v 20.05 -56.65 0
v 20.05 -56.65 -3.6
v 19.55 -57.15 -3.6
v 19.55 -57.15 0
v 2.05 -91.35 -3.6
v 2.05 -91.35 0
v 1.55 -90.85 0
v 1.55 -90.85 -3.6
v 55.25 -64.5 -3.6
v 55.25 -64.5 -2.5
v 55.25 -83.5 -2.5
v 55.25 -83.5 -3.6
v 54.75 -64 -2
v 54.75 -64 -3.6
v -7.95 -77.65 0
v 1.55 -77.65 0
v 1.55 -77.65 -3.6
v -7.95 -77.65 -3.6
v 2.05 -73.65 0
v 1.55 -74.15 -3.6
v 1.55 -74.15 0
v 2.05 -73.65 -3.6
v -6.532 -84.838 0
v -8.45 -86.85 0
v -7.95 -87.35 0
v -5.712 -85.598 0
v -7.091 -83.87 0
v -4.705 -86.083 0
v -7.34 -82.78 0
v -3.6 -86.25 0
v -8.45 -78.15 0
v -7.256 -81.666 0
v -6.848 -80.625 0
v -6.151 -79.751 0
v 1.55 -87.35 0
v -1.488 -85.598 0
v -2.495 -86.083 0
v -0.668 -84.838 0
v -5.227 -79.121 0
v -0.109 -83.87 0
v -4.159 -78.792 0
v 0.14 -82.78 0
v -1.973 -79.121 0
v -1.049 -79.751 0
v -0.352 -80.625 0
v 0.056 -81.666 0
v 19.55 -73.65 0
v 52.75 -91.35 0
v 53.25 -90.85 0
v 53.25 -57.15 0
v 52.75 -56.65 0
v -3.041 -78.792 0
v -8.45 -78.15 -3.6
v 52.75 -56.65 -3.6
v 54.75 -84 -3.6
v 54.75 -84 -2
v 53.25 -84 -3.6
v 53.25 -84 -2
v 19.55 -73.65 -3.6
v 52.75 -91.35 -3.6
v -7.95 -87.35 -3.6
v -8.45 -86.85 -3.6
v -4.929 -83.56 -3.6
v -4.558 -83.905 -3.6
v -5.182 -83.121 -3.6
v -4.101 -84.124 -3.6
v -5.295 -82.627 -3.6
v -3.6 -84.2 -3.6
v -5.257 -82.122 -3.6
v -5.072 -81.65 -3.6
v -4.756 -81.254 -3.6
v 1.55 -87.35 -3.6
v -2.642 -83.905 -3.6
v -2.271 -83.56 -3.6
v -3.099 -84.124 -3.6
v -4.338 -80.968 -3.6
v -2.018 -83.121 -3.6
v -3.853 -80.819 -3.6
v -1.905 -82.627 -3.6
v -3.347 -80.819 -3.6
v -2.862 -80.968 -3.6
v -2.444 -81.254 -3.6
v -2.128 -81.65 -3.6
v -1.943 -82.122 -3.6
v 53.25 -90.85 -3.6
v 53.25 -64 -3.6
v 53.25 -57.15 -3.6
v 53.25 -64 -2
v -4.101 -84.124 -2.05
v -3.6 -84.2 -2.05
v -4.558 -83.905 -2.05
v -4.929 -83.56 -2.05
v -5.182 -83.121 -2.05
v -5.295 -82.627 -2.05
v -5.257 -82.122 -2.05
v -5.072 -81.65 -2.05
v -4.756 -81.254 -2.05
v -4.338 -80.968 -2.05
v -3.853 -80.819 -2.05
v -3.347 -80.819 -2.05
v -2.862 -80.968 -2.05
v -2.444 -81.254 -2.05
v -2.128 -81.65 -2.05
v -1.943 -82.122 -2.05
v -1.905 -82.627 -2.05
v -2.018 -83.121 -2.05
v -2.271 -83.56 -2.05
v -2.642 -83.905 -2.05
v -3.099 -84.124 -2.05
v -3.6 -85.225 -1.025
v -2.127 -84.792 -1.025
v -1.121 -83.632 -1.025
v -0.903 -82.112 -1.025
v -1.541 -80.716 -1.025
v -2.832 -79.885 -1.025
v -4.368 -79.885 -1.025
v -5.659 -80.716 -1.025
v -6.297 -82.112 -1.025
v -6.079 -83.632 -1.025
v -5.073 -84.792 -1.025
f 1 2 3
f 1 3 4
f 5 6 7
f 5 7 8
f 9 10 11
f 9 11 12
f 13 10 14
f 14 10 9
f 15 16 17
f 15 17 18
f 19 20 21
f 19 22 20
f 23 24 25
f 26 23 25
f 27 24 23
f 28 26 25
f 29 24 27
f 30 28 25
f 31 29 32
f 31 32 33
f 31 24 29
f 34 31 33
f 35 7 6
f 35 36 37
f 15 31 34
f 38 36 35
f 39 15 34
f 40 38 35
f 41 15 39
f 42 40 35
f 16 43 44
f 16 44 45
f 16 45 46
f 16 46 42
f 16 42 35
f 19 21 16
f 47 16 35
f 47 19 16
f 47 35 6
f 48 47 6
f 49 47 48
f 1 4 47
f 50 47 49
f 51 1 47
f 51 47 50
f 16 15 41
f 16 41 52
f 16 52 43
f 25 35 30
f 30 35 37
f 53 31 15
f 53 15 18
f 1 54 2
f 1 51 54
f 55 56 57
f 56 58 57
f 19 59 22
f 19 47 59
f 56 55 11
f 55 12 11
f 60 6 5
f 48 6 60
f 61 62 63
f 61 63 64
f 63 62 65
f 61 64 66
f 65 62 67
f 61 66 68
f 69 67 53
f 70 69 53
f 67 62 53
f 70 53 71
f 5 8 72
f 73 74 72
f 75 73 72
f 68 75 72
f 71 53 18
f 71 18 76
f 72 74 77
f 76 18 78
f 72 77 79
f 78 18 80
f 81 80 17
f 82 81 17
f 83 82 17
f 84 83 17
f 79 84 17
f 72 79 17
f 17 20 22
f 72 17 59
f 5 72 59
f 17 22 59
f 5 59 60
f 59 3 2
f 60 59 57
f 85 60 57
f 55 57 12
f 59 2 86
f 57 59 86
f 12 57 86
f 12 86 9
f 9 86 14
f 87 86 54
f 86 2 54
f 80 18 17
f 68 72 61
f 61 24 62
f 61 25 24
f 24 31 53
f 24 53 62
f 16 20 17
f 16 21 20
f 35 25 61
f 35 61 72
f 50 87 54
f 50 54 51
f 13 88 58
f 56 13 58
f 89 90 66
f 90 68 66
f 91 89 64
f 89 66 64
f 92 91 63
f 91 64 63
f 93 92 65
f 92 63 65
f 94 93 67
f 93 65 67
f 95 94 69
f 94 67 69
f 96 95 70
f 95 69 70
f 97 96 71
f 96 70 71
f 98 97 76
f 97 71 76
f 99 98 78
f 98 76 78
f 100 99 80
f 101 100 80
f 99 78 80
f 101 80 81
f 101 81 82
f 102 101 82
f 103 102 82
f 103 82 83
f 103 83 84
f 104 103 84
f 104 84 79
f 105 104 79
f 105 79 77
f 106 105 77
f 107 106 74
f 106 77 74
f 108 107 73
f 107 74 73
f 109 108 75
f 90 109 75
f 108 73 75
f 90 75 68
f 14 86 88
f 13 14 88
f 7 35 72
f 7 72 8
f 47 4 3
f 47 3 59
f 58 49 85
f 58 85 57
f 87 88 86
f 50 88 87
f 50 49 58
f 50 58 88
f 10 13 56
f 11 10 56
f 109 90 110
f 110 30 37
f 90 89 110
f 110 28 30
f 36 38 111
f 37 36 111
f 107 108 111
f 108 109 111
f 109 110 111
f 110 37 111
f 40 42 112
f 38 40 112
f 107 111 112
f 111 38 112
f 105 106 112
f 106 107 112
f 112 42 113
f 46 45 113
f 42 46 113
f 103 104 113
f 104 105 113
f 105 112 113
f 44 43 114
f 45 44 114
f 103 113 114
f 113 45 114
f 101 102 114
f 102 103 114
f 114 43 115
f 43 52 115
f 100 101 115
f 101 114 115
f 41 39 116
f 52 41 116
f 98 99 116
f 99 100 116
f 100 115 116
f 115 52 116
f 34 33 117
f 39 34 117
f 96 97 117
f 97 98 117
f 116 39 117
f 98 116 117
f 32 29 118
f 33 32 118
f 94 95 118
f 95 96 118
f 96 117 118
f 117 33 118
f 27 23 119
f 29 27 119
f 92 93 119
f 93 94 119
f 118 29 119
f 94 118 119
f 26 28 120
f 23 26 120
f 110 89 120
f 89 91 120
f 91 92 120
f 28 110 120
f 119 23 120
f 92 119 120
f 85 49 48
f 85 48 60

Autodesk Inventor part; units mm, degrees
ref_plane "YZ Plane" through (0, 0, 0) normal (1, 0, 0) x (0, 1, 0)
ref_plane "XZ Plane" through (0, 0, 0) normal (0, 1, 0) x (-1, 0, 0)
ref_plane "XY Plane" through (0, 0, 0) normal (0, 0, 1) x (1, 0, 0)
ref_plane "Arbeitsebene1" through (-7.5, 0, 0) normal (0, 0, 1) x (1, 0, 0)
sketch "Skizze1" plane through (-7.5, 0, 0) normal (0, 0, 1) x (1, 0, 0)
  line L0 (-71.1, -93.5) -> (-71.1, 90.5) projected
  line L1 (62.9, -94.5) -> (-70.1, -94.5) projected
  line L2 (63.9, 90.5) -> (63.9, -93.5) projected
  line L3 (-70.1, 91.5) -> (62.9, 91.5) projected
  line L4 (23.9, -70.5) -> (-66.1, -70.5) projected
  line L5 (-66.1, -70.5) -> (-66.1, 73.5) projected
  line L6 (-66.1, 73.5) -> (23.9, 73.5) projected
  line L7 (23.9, 73.5) -> (23.9, -70.5) projected
  line L8 (8.9, -87.5) -> (-1.1, -87.5) projected
  line L9 (-1.1, -87.5) -> (-1.1, -77.5) projected
  line L10 (-1.1, -77.5) -> (8.9, -77.5) projected
  line L11 (8.9, -77.5) -> (8.9, -73.5) projected
  line L12 (8.9, -73.5) -> (26.9, -73.5) projected
  line L13 (26.9, -73.5) -> (26.9, -56.5) projected
  line L14 (26.9, -56.5) -> (60.9, -56.5) projected
  line L15 (60.9, -56.5) -> (60.9, -91.5) projected
  line L16 (60.9, -91.5) -> (8.9, -91.5) projected
  line L17 (8.9, -91.5) -> (8.9, -87.5) projected
  line L18 (-0.95, -77.65) -> (-0.95, -87.35)
  line L19 (-0.95, -87.35) -> (9.05, -87.35)
  line L20 (9.05, -87.35) -> (9.05, -91.35)
  line L21 (9.05, -91.35) -> (60.75, -91.35)
  line L22 (60.75, -91.35) -> (60.75, -56.65)
  line L23 (60.75, -56.65) -> (27.05, -56.65)
  line L24 (27.05, -56.65) -> (27.05, -73.65)
  line L25 (27.05, -73.65) -> (9.05, -73.65)
  line L26 (9.05, -73.65) -> (9.05, -77.65)
  line L27 (9.05, -77.65) -> (-0.95, -77.65)
  line L28 (63.9, -93.5) -> (62.9, -94.5) projected
  line L29 (62.9, 91.5) -> (63.9, 90.5) projected
  line L30 (-71.1, 90.5) -> (-70.1, 91.5) projected
  line L31 (-70.1, -94.5) -> (-71.1, -93.5) projected
  circle A0 centre (43.9, -1.5) radius 7.55 projected
  circle A1 centre (-61.1, -85.5) radius 7.55 projected
  circle A2 centre (-61.1, 82.5) radius 7.55 projected
  point P0 (7.5, 0)
  dimension "d0" = 0.15
extrude "Extrusion1" add sketch "Skizze1" against normal blind 3.6 contours L27 L26 L25 L24 L23 L22 L21 L20 L19 L18
sketch "Skizze2" plane through (-7.5, 0, 0) normal (0, 0, 1) x (1, 0, 0)
  circle A0 centre (3.9, -82.5) radius 2 projected
  point P0 (7.5, 0)
hole "Bohrung1" at (-3.6, -82.5, 0) direction (0, 0, -1) diameter 3.4 depth 8 countersink diameter 7.5 countersink angle 90 clearance for "Innensechskant-Senkkopfschraube DIN EN ISO 10642" size "M3" standard "DIN"
sketch "Skizze3" plane through (53.25, -91.35, 0) normal (1, 0, 0) x (0, 0, -1)
  line L0 (2, 27.35) -> (2, 7.35) projected
  line L1 (2, 7.35) -> (3.6, 7.35)
  line L2 (3.6, 7.35) -> (3.6, 27.35)
  line L3 (3.6, 27.35) -> (2, 27.35)
  line L4 (2, 27.35) -> (2, 7.35)
  point P0 (0, 91.35)
  point P1 (3.6, 34.7)
extrude "Extrusion2" add sketch "Skizze3" along normal blind 2
chamfer "Fasen1" distance 0.5 angle 45 7 edges at (-8.45, -87.35, -1.8) (-8.45, -77.65, -1.8) (1.55, -73.65, -1.8) (1.55, -91.35, -1.8) (19.55, -56.65, -1.8) (53.25, -56.65, -1.8) (53.25, -91.35, -1.8)
chamfer "Fasen2" distance 0.5 angle 45 3 edges at (55.25, -84, -2.8) (55.25, -64, -2.8) (55.25, -74, -2)
properties part number "Kameraturm_Abdeckung_Unten"
